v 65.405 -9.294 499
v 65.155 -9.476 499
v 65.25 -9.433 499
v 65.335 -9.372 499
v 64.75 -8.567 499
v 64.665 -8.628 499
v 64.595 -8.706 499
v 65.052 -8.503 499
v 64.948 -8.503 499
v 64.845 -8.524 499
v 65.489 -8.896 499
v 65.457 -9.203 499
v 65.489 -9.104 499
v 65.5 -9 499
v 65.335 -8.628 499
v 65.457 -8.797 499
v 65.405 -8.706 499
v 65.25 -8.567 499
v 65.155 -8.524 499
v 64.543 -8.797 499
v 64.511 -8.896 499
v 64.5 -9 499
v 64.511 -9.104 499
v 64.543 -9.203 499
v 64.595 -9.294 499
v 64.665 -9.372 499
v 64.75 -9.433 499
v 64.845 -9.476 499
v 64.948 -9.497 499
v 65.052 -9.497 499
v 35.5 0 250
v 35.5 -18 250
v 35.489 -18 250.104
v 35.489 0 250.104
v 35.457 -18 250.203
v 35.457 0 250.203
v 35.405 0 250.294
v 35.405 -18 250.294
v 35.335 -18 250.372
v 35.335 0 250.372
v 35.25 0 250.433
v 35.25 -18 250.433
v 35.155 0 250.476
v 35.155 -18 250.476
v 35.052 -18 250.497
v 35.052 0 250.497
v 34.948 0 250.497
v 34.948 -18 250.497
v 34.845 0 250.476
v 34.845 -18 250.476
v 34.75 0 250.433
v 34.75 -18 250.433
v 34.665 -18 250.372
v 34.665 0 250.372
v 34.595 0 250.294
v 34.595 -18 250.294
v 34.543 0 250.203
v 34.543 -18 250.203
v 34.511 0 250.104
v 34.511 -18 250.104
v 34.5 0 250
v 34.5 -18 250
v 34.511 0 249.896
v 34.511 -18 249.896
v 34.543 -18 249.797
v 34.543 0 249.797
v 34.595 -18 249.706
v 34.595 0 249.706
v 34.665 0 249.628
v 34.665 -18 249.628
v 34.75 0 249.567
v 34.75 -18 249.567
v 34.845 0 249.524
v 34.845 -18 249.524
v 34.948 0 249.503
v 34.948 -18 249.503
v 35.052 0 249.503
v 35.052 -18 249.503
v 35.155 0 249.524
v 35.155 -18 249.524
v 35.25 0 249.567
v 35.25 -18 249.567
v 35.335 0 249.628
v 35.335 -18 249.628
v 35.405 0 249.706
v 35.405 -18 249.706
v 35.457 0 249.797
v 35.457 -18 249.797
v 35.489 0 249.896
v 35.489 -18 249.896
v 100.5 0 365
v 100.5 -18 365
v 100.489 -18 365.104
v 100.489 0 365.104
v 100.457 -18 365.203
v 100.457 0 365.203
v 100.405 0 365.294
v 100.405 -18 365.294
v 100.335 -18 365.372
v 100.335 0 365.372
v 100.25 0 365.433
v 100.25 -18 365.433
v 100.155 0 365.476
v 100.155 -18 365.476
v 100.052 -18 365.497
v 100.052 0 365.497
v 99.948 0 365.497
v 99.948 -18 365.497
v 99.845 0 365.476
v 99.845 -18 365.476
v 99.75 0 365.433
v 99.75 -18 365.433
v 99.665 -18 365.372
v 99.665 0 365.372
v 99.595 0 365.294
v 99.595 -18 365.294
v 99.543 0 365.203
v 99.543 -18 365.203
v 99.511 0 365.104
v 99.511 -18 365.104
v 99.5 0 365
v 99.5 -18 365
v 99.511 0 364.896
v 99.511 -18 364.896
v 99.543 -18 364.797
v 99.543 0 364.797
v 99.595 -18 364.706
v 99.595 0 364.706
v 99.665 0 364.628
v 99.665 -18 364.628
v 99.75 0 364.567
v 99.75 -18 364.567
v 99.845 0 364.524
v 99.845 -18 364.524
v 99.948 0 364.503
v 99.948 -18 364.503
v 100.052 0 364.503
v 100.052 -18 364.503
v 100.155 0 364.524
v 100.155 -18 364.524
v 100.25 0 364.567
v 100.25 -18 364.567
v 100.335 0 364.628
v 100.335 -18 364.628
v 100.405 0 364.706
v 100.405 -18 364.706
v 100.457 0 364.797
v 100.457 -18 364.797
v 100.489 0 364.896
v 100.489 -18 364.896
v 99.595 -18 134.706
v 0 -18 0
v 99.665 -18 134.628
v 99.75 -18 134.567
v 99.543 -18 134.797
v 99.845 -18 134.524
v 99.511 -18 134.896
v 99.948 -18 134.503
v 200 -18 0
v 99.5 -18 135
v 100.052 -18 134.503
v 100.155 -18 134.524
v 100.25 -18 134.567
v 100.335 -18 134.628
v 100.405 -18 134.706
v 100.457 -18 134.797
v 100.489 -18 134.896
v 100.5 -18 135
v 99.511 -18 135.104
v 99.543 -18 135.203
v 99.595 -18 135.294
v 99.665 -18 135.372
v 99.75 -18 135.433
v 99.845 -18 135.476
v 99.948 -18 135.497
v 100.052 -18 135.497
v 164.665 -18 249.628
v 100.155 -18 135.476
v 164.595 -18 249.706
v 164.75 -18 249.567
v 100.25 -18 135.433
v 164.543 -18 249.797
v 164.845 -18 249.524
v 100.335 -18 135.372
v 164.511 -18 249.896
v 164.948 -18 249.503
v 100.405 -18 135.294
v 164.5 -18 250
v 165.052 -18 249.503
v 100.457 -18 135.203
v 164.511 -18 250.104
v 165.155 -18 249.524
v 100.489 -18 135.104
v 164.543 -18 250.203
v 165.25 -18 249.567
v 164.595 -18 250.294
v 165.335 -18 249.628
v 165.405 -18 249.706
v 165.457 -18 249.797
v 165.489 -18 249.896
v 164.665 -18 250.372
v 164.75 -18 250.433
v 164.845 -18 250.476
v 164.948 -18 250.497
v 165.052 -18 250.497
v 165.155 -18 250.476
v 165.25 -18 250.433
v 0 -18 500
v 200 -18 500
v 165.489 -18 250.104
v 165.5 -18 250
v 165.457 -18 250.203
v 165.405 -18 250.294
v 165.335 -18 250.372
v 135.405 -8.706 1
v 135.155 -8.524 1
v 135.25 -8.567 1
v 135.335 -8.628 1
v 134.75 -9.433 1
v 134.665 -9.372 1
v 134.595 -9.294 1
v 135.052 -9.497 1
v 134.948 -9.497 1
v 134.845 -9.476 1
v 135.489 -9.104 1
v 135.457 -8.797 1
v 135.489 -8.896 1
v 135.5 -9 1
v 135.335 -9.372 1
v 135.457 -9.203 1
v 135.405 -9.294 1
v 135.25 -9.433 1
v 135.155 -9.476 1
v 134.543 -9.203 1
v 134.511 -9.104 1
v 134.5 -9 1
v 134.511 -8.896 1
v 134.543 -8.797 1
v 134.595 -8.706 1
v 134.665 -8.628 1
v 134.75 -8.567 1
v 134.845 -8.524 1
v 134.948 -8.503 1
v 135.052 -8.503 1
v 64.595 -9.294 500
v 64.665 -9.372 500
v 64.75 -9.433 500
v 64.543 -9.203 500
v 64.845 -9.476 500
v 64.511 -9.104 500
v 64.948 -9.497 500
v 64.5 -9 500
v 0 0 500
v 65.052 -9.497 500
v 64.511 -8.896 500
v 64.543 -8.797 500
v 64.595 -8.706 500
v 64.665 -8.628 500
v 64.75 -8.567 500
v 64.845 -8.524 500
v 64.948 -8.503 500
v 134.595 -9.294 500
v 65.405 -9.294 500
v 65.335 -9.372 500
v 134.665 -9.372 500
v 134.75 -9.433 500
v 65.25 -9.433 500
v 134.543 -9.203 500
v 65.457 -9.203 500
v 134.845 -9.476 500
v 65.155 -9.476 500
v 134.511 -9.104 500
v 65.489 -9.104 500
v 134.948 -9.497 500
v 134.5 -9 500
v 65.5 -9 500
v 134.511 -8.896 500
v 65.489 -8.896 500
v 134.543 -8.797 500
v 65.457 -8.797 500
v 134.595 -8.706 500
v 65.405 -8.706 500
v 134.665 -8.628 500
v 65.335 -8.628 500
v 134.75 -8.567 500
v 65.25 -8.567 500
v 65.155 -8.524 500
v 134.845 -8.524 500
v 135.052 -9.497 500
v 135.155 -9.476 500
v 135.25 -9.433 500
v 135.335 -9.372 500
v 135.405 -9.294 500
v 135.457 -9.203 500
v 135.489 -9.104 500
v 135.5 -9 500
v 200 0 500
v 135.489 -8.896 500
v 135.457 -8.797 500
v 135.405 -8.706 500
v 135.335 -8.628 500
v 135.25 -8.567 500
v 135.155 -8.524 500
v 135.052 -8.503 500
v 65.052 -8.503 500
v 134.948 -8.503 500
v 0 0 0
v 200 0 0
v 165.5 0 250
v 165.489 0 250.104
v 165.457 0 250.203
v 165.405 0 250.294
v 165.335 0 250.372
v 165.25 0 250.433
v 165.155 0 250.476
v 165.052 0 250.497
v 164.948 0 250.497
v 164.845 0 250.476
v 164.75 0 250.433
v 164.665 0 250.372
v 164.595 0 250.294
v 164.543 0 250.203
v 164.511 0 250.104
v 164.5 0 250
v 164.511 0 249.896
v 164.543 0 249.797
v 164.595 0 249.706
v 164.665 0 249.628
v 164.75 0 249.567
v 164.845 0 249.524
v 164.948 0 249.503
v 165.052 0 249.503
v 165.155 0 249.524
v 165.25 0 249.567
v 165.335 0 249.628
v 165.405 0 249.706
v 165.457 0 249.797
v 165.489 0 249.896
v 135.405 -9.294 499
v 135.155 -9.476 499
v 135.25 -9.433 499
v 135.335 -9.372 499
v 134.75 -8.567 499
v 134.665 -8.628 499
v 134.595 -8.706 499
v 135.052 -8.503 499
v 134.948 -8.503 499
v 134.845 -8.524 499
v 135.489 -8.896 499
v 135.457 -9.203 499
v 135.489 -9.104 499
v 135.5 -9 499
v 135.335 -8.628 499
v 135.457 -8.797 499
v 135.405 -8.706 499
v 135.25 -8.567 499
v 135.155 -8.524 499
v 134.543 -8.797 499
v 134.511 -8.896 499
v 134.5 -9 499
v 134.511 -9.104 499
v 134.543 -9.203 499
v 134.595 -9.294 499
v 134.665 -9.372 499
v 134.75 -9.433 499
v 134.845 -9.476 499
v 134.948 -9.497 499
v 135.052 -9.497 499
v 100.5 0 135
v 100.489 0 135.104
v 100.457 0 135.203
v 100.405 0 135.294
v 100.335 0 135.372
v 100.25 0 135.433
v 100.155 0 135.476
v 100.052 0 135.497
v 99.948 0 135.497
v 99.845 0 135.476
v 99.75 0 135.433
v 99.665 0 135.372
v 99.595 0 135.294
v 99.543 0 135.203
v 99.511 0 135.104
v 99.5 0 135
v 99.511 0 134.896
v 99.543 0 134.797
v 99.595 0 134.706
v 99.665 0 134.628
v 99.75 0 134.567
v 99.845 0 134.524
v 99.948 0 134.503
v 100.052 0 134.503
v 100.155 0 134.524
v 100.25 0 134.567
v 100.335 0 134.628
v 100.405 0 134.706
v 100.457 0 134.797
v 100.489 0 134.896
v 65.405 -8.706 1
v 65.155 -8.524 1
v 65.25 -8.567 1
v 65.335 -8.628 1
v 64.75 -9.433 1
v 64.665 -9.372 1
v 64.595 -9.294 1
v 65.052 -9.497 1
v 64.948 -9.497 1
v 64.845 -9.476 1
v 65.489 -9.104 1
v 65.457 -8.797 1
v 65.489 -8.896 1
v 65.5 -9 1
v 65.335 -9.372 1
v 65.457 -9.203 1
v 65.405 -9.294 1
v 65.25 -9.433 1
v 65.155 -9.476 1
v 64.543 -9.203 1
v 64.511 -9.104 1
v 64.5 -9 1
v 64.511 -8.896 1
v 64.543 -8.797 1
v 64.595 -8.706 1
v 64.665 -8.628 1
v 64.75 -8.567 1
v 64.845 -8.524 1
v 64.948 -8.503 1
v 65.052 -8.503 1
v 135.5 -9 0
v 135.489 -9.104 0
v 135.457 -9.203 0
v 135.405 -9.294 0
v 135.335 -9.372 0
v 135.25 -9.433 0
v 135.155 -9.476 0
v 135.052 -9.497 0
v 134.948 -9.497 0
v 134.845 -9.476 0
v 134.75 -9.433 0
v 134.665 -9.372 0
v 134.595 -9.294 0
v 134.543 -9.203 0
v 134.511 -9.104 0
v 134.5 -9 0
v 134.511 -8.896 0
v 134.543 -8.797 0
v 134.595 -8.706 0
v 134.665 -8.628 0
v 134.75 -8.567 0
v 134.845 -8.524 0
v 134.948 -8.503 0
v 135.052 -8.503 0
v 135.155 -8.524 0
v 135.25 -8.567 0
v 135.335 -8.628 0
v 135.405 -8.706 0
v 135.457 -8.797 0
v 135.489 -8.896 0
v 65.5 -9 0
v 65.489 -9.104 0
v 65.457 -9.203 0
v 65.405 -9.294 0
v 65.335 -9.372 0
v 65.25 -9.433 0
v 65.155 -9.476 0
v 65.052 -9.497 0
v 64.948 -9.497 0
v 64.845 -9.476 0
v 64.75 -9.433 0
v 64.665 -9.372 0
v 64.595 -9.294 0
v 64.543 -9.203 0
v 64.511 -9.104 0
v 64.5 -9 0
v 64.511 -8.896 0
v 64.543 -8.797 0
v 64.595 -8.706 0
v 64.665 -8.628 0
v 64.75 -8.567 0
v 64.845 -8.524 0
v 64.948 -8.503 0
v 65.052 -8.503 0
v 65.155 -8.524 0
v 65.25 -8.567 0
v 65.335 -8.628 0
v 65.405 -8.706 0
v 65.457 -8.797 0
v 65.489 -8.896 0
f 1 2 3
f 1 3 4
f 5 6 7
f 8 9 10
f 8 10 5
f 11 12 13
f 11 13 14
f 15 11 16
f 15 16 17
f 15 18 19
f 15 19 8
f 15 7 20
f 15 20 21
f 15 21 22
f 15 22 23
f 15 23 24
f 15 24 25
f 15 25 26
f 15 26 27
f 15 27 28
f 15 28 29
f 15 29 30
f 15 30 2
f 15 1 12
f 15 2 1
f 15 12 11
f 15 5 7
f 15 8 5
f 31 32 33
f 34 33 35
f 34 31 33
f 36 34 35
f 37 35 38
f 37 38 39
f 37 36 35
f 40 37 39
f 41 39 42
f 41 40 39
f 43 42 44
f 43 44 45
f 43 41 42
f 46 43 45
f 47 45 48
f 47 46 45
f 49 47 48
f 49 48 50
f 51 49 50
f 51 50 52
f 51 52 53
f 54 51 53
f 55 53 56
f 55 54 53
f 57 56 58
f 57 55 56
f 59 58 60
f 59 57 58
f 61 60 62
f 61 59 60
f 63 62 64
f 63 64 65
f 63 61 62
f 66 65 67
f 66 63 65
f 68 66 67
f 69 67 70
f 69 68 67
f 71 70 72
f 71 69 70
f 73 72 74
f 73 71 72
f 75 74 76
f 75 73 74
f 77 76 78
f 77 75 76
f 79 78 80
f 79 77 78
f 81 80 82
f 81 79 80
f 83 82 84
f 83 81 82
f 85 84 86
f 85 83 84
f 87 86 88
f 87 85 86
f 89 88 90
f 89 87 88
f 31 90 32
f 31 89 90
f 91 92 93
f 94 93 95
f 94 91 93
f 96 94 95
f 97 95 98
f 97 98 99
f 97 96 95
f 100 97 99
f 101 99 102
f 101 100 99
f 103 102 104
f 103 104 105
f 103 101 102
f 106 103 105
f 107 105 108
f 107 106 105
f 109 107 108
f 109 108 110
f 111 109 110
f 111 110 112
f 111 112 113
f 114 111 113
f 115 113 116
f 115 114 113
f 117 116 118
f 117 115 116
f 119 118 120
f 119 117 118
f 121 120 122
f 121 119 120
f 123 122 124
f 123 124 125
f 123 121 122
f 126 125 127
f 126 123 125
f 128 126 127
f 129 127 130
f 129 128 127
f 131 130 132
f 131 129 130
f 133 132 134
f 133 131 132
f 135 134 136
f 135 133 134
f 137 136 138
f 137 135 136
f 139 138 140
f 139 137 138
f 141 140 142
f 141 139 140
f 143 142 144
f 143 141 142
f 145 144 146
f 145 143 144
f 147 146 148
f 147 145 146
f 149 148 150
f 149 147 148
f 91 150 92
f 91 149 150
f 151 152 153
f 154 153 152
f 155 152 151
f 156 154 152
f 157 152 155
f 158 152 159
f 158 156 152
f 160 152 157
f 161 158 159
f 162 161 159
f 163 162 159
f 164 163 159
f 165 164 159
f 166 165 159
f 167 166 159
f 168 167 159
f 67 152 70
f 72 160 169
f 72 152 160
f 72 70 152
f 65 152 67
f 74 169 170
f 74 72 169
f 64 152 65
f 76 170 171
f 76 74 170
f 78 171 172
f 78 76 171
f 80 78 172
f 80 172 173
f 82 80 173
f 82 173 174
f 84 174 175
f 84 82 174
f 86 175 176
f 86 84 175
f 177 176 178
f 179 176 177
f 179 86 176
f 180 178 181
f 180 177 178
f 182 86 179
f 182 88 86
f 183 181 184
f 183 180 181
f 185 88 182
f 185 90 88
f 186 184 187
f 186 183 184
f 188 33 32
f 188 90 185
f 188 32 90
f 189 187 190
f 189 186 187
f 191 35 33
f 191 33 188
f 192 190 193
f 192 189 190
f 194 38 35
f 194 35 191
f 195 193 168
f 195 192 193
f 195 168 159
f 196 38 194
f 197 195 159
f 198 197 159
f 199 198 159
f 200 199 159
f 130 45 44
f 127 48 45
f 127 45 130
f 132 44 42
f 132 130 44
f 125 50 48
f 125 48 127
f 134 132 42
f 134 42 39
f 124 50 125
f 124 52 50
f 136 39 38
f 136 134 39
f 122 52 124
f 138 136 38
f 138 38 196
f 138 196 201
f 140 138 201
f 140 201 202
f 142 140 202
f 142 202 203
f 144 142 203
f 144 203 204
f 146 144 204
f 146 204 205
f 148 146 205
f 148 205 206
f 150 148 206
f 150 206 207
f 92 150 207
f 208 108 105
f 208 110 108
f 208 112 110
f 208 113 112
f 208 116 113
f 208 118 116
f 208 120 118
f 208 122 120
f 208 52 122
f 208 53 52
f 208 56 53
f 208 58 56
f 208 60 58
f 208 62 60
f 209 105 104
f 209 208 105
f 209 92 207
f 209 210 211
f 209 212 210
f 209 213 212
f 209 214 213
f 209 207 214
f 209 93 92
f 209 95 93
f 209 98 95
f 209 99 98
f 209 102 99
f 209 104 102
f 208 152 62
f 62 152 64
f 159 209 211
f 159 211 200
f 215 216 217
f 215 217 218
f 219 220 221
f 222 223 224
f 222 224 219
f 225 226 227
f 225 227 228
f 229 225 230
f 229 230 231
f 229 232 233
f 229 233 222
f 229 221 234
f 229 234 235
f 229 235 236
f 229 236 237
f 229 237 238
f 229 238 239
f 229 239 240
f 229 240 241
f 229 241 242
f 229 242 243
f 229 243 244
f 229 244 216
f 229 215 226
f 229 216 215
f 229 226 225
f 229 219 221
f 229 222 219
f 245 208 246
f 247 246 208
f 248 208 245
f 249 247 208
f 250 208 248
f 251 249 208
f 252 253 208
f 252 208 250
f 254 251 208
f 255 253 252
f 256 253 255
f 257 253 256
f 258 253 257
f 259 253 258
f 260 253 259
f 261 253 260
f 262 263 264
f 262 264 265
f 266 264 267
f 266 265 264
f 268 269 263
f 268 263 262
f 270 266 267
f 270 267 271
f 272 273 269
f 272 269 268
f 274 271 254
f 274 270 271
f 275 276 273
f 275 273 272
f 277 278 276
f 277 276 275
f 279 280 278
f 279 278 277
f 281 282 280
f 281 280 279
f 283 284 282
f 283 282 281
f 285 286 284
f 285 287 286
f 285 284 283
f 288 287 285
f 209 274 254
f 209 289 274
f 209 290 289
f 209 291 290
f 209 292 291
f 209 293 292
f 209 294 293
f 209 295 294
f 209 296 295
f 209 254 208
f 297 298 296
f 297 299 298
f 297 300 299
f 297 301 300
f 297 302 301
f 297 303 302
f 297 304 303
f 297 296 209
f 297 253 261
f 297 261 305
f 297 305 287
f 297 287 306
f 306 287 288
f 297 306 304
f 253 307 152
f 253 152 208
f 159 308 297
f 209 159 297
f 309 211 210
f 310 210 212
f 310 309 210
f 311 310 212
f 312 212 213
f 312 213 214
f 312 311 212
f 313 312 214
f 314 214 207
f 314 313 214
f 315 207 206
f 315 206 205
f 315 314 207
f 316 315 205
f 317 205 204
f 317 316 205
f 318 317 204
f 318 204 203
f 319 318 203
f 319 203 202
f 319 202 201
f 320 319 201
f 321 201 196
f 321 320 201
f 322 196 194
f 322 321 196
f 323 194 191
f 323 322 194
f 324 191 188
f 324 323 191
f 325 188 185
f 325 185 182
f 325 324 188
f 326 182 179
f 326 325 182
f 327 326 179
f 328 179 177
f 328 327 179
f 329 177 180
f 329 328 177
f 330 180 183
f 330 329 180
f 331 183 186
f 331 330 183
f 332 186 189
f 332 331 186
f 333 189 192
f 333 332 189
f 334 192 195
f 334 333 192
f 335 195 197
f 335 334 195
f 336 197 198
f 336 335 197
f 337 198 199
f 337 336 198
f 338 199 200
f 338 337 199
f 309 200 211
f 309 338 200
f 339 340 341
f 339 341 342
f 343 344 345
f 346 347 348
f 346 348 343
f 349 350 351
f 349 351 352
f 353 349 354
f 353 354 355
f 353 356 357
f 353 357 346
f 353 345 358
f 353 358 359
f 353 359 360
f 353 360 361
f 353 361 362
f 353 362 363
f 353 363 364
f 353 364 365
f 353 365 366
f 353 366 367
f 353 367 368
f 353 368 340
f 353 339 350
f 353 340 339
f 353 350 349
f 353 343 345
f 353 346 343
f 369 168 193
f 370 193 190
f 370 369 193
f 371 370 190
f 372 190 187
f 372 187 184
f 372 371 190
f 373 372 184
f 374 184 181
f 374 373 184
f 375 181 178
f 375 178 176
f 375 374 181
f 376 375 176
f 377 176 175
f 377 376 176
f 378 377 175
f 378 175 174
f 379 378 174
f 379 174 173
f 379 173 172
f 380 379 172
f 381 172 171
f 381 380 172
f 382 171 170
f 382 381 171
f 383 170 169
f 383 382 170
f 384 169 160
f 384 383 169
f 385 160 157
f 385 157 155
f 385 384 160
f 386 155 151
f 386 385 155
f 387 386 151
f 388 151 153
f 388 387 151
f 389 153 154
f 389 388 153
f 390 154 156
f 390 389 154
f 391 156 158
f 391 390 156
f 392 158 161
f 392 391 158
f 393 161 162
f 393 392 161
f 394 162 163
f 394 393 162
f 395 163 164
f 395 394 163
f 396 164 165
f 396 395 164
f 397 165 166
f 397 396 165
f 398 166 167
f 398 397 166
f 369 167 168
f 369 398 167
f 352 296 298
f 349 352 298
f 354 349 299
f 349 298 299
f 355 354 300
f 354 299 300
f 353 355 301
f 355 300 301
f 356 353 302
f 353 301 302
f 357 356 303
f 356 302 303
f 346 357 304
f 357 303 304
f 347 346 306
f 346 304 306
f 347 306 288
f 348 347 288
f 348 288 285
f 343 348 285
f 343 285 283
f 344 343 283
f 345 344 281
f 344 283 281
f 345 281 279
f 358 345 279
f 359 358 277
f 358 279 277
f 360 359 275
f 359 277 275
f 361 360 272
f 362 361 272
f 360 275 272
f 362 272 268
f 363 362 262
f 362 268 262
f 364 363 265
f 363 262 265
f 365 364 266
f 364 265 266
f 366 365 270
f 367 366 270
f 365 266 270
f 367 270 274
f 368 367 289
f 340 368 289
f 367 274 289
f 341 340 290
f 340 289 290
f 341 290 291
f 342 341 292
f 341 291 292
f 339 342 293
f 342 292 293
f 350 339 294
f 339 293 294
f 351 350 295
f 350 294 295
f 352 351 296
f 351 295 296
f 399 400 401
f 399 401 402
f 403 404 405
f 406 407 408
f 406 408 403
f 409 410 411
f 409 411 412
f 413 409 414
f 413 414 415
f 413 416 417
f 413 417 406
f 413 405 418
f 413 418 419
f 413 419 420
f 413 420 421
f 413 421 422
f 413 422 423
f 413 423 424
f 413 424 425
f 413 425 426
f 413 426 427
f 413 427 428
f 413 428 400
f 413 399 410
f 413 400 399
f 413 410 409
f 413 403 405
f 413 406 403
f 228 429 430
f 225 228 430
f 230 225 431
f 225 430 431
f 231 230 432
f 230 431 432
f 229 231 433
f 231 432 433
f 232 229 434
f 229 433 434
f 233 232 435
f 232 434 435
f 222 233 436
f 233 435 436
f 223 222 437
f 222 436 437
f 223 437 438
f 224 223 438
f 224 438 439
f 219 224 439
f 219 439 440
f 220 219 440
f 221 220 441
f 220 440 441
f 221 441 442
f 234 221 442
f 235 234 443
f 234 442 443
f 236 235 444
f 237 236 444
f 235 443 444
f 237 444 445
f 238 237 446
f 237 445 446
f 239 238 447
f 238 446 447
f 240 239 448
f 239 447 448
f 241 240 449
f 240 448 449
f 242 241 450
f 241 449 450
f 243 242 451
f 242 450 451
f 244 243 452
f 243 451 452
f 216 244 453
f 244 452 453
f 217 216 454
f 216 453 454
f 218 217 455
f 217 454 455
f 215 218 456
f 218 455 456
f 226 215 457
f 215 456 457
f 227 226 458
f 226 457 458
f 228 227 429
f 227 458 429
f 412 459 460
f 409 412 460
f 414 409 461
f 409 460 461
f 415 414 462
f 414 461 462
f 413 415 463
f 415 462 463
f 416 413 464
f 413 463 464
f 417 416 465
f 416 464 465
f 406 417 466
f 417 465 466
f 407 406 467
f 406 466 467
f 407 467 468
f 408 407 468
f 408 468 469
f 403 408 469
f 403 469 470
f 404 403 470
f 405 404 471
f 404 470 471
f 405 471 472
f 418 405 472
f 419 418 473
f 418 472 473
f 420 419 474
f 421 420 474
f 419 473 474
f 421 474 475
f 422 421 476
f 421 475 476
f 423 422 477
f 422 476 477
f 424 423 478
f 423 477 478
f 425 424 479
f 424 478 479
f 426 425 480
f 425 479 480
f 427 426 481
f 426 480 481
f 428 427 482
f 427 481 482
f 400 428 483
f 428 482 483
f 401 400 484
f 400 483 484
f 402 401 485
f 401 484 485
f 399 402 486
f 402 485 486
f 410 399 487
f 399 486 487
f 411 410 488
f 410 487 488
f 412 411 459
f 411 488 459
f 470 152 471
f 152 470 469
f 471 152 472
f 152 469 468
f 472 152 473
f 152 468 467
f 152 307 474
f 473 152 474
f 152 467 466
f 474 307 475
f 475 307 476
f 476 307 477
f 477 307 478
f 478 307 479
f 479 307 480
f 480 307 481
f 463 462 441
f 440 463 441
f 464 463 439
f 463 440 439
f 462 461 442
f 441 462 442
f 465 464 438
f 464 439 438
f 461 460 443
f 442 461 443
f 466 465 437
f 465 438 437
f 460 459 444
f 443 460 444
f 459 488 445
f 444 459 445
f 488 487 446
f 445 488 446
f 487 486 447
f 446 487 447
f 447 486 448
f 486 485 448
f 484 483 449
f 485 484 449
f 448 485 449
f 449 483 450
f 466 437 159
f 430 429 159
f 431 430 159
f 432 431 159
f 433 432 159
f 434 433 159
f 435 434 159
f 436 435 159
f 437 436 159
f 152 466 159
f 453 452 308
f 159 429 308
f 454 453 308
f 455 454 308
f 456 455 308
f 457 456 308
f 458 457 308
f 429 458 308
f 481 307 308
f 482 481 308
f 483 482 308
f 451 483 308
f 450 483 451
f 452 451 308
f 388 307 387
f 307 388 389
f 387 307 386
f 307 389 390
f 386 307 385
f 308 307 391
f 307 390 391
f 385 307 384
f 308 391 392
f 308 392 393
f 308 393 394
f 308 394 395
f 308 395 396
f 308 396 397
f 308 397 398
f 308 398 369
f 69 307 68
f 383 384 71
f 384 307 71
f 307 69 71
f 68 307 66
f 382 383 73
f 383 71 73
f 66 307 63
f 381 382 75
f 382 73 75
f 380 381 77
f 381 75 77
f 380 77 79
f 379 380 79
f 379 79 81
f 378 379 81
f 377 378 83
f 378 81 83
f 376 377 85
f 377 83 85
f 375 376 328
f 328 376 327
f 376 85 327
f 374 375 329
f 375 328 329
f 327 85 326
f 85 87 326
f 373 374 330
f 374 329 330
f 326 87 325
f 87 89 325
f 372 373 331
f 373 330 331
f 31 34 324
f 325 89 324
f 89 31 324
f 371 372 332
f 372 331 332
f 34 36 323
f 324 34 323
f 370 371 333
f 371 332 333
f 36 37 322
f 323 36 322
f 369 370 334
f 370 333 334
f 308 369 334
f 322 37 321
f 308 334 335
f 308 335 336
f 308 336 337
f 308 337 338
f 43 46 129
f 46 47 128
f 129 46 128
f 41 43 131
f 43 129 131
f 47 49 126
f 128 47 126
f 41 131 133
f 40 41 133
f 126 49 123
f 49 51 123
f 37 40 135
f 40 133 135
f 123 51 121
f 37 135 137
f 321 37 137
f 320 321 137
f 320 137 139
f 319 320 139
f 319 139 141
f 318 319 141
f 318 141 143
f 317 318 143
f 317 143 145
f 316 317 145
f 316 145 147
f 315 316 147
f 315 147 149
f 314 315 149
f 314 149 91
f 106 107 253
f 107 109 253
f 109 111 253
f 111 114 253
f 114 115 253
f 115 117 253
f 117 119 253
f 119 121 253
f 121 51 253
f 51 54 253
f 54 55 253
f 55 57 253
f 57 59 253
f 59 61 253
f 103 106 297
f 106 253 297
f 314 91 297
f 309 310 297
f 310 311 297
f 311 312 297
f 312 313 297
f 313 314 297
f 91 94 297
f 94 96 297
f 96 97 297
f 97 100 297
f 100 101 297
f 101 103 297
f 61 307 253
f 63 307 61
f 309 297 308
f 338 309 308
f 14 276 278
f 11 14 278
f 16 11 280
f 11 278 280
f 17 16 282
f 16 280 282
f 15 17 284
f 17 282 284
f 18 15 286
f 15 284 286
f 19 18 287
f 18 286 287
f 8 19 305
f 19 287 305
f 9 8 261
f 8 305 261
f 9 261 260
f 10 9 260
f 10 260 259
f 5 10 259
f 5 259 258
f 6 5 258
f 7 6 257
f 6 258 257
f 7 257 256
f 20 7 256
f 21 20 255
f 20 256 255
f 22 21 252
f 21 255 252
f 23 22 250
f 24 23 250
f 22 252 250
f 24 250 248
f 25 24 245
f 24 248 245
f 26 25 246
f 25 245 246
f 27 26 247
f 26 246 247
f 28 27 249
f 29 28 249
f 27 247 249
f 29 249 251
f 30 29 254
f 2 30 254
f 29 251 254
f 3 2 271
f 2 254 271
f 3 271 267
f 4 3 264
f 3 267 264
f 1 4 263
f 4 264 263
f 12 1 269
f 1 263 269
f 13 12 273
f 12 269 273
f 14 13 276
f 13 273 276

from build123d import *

# Parameters (mm, degrees)
F0_W     = 200
F0_H     = 500
F0_R     = 0.5
F1_DEPTH = 18
F2_R     = 0.5
F3_DEPTH = 1
F4_R     = 0.5
F5_DEPTH = 1


with BuildPart() as f1:
    # F0 (on Front) → F1 (new body)
    with BuildSketch(Plane.XZ):
        with Locations((100, 250)):
            Rectangle(F0_W, F0_H)
        with Locations((100, 135)):
            Circle(F0_R, mode=Mode.SUBTRACT)
        with Locations((35, 250)):
            Circle(F0_R, mode=Mode.SUBTRACT)
        with Locations((100, 365)):
            Circle(F0_R, mode=Mode.SUBTRACT)
        with Locations((165, 250)):
            Circle(F0_R, mode=Mode.SUBTRACT)
    extrude(amount=F1_DEPTH)

    # F2 (on face) → F3 (cut)
    with BuildSketch(Plane.XY.offset(500)):
        with Locations((65, -9)):
            Circle(F2_R)
        with Locations((135, -9)):
            Circle(F2_R)
    extrude(amount=-F3_DEPTH, mode=Mode.SUBTRACT)

    # F4 (on face) → F5 (cut)
    with BuildSketch(Plane(origin=(0, 0, 0), x_dir=(1, 0, 0), z_dir=(0, 0, -1))):
        with Locations((65, 9)):
            Circle(F4_R)
        with Locations((135, 9)):
            Circle(F4_R)
    extrude(amount=-F5_DEPTH, mode=Mode.SUBTRACT)


solid = f1.part
